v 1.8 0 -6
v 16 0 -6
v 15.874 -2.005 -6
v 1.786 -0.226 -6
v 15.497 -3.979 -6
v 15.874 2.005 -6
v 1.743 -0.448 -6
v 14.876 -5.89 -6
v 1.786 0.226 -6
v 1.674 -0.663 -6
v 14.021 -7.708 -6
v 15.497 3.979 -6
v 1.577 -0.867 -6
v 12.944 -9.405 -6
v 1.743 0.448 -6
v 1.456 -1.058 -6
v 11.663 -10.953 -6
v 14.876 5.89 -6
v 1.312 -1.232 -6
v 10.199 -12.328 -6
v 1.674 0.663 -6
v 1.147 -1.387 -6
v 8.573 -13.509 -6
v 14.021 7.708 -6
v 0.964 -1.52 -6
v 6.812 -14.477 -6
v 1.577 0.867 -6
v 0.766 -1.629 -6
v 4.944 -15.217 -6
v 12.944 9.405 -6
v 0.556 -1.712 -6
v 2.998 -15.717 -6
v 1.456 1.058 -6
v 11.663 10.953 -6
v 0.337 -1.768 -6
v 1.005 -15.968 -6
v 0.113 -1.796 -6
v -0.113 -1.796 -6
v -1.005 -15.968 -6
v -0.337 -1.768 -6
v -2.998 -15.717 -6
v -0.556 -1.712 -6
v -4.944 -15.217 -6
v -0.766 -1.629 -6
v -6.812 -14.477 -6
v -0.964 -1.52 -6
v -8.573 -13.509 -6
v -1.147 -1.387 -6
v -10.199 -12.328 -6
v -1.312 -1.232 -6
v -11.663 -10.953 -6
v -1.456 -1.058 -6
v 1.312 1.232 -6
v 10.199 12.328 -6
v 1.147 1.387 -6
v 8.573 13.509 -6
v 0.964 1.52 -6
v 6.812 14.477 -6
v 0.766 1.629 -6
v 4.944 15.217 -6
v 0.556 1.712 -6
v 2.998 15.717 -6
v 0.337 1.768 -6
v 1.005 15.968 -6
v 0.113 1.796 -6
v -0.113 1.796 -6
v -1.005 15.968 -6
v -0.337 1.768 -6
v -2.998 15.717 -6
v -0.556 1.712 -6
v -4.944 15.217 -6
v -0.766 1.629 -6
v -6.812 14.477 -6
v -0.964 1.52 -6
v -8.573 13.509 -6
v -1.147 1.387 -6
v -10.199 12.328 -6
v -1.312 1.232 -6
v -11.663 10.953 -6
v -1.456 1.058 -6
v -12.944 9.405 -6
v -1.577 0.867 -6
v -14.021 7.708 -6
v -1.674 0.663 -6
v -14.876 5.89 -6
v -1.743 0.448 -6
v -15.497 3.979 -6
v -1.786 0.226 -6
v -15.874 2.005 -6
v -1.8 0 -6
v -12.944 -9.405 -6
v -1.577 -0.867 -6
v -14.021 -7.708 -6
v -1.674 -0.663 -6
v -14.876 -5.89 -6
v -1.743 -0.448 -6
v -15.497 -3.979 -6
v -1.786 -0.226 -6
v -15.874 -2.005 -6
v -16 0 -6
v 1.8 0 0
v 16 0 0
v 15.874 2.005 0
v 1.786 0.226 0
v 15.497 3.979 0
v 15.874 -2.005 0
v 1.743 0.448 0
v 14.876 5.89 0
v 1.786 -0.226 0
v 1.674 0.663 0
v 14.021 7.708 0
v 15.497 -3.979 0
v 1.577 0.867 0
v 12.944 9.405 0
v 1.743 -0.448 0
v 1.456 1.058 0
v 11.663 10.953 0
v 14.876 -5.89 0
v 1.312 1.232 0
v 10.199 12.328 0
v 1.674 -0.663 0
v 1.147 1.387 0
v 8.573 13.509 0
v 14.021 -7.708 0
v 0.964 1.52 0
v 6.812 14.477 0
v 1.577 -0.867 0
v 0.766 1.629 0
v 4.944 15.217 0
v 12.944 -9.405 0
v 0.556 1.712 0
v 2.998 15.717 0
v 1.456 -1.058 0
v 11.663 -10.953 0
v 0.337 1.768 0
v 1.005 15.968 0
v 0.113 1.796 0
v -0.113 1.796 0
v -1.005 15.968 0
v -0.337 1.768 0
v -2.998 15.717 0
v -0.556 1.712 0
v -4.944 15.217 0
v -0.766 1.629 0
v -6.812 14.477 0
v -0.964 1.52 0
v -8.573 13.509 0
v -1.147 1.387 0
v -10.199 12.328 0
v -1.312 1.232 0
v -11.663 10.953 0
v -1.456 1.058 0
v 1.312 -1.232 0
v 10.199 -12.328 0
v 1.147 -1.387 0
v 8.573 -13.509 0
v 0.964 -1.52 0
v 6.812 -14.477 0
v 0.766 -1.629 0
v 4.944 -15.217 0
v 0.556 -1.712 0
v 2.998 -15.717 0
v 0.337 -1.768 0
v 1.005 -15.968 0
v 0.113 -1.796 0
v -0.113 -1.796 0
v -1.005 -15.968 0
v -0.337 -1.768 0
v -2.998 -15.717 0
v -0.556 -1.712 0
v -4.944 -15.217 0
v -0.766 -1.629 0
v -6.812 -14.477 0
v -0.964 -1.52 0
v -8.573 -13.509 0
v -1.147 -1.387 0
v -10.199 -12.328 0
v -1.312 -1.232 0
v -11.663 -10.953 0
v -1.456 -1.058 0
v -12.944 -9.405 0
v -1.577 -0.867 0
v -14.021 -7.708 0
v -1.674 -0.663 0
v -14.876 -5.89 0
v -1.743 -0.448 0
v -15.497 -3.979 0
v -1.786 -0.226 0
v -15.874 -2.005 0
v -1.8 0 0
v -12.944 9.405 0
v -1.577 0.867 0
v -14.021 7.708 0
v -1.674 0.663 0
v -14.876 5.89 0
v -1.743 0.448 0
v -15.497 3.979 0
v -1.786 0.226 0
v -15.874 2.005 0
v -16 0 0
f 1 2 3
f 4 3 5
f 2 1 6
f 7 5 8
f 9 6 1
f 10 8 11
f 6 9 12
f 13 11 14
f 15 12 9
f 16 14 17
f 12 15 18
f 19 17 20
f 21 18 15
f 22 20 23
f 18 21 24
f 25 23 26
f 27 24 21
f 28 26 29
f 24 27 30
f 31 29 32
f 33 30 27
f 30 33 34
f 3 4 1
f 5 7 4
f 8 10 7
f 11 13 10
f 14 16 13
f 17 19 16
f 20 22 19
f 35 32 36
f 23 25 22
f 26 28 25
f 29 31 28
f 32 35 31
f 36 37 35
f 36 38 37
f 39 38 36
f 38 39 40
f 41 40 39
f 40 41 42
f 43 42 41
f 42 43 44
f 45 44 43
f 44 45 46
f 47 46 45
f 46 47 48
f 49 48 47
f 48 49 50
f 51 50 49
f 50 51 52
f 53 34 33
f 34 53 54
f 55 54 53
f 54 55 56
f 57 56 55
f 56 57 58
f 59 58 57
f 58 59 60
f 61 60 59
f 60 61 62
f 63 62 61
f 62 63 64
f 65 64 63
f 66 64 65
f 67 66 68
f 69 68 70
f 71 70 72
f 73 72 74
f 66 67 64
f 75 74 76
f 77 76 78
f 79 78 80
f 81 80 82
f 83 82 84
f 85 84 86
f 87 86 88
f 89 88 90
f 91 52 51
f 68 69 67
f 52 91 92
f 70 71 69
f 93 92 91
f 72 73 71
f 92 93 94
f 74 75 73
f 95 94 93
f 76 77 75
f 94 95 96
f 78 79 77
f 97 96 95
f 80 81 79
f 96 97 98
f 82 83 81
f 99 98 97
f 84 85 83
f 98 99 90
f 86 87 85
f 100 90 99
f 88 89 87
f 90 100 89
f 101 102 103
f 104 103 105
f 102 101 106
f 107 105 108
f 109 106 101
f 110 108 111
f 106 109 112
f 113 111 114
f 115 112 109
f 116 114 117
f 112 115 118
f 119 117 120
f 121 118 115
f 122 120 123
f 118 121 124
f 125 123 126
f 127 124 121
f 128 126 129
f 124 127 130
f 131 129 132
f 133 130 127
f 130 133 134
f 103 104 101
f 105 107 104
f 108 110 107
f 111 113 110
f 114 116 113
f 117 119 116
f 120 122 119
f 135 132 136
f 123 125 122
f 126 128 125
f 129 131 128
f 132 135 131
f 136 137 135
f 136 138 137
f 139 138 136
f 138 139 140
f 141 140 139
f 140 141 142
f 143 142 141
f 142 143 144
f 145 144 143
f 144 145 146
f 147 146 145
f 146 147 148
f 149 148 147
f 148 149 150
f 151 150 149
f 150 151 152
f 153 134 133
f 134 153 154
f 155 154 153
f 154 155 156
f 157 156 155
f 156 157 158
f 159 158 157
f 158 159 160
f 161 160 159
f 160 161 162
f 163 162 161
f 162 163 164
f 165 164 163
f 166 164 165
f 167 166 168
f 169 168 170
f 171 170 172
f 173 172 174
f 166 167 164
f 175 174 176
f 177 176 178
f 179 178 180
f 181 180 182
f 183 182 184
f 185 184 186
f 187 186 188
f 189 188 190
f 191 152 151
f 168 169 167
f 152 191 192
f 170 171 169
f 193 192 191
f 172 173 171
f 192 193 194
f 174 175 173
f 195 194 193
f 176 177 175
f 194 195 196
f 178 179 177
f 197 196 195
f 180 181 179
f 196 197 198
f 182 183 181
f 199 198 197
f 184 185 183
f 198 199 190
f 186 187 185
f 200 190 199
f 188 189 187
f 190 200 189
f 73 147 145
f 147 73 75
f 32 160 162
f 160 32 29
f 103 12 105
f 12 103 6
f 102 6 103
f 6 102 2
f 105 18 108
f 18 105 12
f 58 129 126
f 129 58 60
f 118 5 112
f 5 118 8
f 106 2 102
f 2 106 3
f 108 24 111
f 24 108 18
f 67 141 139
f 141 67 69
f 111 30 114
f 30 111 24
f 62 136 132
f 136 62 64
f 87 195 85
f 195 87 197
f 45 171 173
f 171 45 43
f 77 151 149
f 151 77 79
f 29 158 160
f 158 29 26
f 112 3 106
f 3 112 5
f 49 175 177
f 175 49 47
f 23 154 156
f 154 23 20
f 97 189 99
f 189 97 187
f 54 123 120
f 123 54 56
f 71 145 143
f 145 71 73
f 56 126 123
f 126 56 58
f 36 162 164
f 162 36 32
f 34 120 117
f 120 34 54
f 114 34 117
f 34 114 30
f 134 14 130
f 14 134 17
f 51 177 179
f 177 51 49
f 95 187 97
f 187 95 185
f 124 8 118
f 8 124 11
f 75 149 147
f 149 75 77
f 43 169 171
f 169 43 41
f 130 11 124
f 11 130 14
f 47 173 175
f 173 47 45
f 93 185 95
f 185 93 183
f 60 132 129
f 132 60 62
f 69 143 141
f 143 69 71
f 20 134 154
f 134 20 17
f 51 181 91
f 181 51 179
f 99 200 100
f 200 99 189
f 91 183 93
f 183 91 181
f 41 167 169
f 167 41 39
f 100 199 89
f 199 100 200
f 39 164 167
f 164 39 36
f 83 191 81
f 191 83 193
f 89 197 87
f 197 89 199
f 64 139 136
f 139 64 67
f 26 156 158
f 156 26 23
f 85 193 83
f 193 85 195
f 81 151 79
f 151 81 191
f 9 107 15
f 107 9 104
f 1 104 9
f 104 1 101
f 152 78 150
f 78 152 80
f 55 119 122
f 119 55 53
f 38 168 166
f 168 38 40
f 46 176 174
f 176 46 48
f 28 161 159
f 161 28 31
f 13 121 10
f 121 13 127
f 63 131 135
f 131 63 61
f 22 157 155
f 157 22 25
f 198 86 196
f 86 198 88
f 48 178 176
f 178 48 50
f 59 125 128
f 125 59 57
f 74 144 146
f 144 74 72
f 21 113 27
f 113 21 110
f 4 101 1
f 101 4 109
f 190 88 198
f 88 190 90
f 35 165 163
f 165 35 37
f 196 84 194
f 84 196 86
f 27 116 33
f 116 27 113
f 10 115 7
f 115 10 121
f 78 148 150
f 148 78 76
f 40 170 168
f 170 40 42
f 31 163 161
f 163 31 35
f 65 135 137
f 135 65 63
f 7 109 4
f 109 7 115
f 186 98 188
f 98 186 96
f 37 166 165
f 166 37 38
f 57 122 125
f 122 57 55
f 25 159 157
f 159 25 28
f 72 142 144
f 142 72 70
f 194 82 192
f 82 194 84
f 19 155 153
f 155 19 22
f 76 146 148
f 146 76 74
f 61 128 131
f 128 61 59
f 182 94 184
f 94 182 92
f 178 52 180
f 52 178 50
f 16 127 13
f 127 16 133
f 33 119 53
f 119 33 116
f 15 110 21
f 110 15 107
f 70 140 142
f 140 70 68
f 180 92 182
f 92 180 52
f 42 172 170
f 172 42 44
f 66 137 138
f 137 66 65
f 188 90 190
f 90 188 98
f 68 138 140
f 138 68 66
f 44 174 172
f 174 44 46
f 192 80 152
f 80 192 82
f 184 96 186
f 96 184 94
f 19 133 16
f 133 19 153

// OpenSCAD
$fn = 50;


difference() {
	union() {
		translate(v = [0, 0, -6.0000000000]) {
			cylinder(h = 6, r = 10.0000000000);
		}
		translate(v = [0, 0, -6.0000000000]) {
			cylinder(h = 6, r = 16.0000000000);
		}
	}
	union() {
		#translate(v = [0, 0, -6]) {
			cylinder(h = 6, r = 1.8000000000);
		}
	}
}
